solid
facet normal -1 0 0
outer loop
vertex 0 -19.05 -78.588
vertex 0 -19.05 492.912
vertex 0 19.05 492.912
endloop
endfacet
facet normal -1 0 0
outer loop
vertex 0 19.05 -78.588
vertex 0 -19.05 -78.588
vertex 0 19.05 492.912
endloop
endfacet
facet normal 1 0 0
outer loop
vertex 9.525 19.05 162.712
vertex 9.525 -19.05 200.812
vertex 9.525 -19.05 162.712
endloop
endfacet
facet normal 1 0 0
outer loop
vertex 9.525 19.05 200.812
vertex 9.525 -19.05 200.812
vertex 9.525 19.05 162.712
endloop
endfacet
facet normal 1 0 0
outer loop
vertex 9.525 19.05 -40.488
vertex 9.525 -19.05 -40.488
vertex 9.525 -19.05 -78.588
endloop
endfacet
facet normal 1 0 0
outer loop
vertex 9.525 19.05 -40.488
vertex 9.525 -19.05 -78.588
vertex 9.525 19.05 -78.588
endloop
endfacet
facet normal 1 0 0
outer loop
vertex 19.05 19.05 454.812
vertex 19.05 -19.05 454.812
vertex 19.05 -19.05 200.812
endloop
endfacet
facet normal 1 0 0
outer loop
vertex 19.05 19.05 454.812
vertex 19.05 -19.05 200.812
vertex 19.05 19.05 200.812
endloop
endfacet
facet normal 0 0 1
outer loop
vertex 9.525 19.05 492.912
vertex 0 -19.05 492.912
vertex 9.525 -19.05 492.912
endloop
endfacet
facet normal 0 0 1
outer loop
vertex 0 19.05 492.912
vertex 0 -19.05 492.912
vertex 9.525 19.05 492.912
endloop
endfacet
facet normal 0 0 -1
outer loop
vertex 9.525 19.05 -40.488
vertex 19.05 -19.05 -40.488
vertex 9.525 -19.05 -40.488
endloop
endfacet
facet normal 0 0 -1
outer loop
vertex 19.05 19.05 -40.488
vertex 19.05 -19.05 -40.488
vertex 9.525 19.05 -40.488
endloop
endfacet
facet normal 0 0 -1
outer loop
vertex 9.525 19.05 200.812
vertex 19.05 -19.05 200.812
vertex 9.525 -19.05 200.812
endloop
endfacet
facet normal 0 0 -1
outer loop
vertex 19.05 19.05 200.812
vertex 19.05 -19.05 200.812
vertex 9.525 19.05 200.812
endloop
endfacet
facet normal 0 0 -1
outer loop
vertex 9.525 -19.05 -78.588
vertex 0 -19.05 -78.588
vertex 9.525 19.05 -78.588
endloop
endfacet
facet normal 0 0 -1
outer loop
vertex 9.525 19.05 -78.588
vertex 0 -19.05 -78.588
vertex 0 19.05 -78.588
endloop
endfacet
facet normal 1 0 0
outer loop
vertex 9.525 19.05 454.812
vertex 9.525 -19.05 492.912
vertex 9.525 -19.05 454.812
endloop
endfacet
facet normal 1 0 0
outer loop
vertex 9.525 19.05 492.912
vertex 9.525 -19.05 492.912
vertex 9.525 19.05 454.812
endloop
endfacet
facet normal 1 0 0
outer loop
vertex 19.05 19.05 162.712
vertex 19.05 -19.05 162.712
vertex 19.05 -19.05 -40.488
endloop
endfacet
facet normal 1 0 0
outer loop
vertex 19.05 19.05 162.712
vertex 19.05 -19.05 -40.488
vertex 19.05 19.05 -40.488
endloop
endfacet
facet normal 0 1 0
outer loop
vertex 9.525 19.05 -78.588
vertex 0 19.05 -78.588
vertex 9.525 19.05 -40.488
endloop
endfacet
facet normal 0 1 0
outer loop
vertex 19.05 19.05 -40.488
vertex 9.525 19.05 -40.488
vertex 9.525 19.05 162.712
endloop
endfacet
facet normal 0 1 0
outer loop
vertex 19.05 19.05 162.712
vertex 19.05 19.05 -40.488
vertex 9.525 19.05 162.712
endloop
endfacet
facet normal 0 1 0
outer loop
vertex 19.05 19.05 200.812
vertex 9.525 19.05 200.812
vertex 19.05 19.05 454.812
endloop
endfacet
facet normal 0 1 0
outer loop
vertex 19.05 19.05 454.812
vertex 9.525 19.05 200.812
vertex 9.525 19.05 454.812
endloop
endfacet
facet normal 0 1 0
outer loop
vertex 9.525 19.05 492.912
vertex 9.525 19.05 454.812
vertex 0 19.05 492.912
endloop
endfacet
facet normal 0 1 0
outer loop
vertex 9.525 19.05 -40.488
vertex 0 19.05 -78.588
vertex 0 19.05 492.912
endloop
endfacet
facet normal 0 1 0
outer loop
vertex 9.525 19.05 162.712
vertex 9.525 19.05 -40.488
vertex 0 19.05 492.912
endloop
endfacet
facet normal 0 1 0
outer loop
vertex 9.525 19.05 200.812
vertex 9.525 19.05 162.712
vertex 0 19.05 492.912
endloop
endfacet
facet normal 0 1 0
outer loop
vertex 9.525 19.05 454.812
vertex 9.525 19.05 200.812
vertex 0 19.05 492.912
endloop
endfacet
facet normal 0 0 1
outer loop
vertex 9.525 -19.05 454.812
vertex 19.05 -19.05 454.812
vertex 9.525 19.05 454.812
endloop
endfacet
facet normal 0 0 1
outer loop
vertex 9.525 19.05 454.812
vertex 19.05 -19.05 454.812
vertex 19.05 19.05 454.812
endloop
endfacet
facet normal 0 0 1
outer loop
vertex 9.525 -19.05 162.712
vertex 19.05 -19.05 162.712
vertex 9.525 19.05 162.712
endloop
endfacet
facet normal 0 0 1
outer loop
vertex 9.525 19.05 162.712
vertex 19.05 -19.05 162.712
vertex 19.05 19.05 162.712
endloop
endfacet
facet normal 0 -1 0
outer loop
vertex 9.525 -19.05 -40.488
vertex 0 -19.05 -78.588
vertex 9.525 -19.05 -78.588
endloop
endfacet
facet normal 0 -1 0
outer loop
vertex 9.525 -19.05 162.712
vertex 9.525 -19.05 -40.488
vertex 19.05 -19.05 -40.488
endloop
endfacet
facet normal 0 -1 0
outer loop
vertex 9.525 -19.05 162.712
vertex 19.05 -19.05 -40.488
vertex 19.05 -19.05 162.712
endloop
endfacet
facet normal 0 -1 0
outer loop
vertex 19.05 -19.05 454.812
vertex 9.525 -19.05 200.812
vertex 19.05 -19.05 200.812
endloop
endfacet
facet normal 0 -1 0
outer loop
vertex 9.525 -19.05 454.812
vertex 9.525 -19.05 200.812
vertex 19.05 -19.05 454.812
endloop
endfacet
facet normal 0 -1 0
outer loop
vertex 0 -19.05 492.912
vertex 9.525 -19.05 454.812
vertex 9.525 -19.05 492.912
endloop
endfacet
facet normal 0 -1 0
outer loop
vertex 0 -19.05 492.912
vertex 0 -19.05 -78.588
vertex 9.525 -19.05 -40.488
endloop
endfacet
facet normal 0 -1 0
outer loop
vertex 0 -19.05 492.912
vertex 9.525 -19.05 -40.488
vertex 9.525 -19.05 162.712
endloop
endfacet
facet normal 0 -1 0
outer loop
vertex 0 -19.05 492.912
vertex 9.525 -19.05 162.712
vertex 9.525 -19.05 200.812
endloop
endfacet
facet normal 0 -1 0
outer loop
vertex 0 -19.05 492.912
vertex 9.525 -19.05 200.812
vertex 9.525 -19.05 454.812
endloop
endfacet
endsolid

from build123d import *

# Parameters (mm, degrees)
F0_W     = 38.1
F0_H     = 571.5
F1_DEPTH = 19.05
F2_W     = 38.1
F2_H     = 38.1
F3_DEPTH = 9.525


with BuildPart() as f1:
    # F0 (on Right) → F1 (new body)
    with BuildSketch(Plane.YZ):
        with Locations((0, 207.162097)):
            Rectangle(F0_W, F0_H)
    extrude(amount=F1_DEPTH)

    # F2 (on face) → F3 (cut)
    with BuildSketch(Plane.YZ.offset(19.05)):
        with Locations((0, 473.862097)):
            Rectangle(F2_W, F2_H)
        with Locations((0, 181.762097)):
            Rectangle(F2_W, F2_H)
        with Locations((0, -59.537903)):
            Rectangle(F2_W, F2_H)
    extrude(amount=-F3_DEPTH, mode=Mode.SUBTRACT)


solid = f1.part
